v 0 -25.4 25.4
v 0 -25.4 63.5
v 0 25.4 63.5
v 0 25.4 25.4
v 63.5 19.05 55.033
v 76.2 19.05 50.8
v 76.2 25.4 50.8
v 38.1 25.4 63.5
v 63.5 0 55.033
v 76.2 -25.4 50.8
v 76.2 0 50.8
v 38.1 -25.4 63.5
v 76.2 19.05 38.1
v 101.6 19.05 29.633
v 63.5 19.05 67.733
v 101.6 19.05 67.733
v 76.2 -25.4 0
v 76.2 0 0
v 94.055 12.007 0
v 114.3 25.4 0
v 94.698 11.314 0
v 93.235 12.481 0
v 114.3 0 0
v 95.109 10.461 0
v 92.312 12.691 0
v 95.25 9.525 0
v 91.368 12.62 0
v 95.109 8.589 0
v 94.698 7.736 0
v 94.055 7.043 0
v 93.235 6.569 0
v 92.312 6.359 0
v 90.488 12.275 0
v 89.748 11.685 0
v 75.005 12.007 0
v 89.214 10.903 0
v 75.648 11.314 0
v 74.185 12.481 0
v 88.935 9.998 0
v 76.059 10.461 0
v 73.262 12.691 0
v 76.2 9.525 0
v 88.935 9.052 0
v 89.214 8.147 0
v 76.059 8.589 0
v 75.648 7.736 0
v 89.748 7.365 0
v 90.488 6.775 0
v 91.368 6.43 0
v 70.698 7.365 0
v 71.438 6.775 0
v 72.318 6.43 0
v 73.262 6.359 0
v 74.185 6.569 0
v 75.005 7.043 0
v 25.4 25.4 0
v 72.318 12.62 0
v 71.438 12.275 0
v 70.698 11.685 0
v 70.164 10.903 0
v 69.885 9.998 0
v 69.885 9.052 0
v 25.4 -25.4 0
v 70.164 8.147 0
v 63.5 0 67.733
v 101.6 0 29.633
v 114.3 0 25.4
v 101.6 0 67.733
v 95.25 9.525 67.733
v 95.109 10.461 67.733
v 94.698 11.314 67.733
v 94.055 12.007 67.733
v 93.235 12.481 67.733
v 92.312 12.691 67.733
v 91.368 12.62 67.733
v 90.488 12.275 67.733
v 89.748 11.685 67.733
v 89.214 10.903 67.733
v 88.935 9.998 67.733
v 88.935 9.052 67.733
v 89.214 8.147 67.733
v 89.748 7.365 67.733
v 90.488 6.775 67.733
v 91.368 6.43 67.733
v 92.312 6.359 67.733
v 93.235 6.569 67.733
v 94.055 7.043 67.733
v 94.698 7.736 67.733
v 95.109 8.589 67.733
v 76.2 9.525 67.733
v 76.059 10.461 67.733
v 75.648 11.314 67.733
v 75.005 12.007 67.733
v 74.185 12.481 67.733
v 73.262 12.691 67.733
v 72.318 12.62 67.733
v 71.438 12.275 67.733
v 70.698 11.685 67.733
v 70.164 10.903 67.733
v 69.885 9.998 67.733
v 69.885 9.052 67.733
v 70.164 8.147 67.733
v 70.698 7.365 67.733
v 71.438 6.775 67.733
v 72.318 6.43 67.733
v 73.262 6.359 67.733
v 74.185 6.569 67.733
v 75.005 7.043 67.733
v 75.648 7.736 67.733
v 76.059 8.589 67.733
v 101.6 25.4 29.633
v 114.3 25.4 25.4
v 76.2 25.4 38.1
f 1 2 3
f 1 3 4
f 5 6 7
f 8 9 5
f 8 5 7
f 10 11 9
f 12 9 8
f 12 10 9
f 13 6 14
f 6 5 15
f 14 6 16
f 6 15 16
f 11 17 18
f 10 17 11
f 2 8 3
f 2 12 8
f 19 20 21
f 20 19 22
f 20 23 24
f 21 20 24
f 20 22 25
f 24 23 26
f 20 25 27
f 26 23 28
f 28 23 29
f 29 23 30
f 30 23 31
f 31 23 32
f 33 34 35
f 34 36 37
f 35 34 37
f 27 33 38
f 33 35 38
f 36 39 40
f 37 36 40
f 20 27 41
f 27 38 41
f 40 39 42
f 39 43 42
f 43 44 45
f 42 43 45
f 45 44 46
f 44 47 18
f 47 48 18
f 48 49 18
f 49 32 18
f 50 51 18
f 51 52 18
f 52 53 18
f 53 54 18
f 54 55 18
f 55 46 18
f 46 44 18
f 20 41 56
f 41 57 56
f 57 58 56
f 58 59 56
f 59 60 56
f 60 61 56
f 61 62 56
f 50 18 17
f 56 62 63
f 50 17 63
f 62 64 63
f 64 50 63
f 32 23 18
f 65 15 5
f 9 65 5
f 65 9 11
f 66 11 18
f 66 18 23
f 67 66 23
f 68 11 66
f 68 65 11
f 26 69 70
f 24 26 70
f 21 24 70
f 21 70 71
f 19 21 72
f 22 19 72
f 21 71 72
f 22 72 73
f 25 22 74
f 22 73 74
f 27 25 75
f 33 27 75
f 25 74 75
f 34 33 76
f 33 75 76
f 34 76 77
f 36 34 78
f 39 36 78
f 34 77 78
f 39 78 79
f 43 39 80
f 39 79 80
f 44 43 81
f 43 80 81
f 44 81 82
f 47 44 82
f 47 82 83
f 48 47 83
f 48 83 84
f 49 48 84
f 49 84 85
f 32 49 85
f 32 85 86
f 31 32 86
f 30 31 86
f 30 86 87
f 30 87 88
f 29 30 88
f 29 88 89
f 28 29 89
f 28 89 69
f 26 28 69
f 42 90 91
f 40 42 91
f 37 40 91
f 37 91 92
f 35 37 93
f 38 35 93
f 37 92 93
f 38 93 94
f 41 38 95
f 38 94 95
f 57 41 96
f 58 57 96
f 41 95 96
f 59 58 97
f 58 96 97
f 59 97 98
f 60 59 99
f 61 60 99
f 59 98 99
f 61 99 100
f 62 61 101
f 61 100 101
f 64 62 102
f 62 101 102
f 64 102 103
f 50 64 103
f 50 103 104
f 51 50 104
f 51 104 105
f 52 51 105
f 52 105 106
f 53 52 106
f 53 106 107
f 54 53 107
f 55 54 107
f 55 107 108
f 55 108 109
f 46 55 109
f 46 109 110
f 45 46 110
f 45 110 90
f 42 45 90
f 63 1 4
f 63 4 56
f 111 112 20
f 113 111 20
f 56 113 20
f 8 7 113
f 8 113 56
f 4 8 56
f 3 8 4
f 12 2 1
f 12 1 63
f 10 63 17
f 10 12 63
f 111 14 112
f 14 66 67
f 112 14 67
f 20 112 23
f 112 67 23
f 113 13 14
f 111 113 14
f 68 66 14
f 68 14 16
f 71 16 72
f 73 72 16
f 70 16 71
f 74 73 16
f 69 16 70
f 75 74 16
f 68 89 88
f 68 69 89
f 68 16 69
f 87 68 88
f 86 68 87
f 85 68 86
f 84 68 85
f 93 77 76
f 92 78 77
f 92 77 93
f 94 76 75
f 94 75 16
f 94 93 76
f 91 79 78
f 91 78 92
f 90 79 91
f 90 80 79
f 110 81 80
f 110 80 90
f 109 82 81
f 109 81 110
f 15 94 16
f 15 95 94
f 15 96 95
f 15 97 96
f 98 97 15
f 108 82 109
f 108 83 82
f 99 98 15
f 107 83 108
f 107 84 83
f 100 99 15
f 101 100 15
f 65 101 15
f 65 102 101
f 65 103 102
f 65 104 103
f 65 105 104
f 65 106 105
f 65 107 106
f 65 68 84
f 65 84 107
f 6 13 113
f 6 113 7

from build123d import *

# Parameters (mm, degrees)
F1_DEPTH = 25.4
F3_DEPTH = 19.05
F5_DEPTH = 6.35
F6_R     = 3.175
F7_DEPTH = 67.7343333333


with BuildPart() as f1:
    # F0 (on Front) → F1 (new body, symmetric)
    with BuildSketch(Plane.XZ):
        Polygon((38.1, 63.5), (0, 63.5), (0, 25.4), (25.4, 0), (76.2, 0), (76.2, 50.8), align=None)
    extrude(amount=F1_DEPTH, both=True)

    # F2 (on Front) → F3 (join)
    with BuildSketch(Plane.XZ):
        Polygon((63.5, 67.7333333333), (63.5, 55.0333333333), (76.2, 50.8), (76.2, 0), (114.3, 0), (114.3, 25.4), (101.6, 29.6333333333), (101.6, 67.7333333333), align=None)
    extrude(amount=-F3_DEPTH)

    # F4 (on face) → F5 (join)
    with BuildSketch(Plane(origin=(0, 19.05, 0), x_dir=(-1, 0, 0), z_dir=(0, 1, 0))):
        Polygon((-101.6, 29.6333333333), (-114.3, 25.4), (-114.3, 0), (-76.2, 0), (-76.2, 38.1), align=None)
    extrude(amount=F5_DEPTH)

    # F6 (on face) → F7 (cut, through all)
    with BuildSketch(Plane.XY.offset(67.7333333333)):
        with Locations((73.025, 9.525)):
            Circle(F6_R)
        with Locations((92.075, 9.525)):
            Circle(F6_R)
    extrude(amount=-F7_DEPTH, mode=Mode.SUBTRACT)


solid = f1.part
